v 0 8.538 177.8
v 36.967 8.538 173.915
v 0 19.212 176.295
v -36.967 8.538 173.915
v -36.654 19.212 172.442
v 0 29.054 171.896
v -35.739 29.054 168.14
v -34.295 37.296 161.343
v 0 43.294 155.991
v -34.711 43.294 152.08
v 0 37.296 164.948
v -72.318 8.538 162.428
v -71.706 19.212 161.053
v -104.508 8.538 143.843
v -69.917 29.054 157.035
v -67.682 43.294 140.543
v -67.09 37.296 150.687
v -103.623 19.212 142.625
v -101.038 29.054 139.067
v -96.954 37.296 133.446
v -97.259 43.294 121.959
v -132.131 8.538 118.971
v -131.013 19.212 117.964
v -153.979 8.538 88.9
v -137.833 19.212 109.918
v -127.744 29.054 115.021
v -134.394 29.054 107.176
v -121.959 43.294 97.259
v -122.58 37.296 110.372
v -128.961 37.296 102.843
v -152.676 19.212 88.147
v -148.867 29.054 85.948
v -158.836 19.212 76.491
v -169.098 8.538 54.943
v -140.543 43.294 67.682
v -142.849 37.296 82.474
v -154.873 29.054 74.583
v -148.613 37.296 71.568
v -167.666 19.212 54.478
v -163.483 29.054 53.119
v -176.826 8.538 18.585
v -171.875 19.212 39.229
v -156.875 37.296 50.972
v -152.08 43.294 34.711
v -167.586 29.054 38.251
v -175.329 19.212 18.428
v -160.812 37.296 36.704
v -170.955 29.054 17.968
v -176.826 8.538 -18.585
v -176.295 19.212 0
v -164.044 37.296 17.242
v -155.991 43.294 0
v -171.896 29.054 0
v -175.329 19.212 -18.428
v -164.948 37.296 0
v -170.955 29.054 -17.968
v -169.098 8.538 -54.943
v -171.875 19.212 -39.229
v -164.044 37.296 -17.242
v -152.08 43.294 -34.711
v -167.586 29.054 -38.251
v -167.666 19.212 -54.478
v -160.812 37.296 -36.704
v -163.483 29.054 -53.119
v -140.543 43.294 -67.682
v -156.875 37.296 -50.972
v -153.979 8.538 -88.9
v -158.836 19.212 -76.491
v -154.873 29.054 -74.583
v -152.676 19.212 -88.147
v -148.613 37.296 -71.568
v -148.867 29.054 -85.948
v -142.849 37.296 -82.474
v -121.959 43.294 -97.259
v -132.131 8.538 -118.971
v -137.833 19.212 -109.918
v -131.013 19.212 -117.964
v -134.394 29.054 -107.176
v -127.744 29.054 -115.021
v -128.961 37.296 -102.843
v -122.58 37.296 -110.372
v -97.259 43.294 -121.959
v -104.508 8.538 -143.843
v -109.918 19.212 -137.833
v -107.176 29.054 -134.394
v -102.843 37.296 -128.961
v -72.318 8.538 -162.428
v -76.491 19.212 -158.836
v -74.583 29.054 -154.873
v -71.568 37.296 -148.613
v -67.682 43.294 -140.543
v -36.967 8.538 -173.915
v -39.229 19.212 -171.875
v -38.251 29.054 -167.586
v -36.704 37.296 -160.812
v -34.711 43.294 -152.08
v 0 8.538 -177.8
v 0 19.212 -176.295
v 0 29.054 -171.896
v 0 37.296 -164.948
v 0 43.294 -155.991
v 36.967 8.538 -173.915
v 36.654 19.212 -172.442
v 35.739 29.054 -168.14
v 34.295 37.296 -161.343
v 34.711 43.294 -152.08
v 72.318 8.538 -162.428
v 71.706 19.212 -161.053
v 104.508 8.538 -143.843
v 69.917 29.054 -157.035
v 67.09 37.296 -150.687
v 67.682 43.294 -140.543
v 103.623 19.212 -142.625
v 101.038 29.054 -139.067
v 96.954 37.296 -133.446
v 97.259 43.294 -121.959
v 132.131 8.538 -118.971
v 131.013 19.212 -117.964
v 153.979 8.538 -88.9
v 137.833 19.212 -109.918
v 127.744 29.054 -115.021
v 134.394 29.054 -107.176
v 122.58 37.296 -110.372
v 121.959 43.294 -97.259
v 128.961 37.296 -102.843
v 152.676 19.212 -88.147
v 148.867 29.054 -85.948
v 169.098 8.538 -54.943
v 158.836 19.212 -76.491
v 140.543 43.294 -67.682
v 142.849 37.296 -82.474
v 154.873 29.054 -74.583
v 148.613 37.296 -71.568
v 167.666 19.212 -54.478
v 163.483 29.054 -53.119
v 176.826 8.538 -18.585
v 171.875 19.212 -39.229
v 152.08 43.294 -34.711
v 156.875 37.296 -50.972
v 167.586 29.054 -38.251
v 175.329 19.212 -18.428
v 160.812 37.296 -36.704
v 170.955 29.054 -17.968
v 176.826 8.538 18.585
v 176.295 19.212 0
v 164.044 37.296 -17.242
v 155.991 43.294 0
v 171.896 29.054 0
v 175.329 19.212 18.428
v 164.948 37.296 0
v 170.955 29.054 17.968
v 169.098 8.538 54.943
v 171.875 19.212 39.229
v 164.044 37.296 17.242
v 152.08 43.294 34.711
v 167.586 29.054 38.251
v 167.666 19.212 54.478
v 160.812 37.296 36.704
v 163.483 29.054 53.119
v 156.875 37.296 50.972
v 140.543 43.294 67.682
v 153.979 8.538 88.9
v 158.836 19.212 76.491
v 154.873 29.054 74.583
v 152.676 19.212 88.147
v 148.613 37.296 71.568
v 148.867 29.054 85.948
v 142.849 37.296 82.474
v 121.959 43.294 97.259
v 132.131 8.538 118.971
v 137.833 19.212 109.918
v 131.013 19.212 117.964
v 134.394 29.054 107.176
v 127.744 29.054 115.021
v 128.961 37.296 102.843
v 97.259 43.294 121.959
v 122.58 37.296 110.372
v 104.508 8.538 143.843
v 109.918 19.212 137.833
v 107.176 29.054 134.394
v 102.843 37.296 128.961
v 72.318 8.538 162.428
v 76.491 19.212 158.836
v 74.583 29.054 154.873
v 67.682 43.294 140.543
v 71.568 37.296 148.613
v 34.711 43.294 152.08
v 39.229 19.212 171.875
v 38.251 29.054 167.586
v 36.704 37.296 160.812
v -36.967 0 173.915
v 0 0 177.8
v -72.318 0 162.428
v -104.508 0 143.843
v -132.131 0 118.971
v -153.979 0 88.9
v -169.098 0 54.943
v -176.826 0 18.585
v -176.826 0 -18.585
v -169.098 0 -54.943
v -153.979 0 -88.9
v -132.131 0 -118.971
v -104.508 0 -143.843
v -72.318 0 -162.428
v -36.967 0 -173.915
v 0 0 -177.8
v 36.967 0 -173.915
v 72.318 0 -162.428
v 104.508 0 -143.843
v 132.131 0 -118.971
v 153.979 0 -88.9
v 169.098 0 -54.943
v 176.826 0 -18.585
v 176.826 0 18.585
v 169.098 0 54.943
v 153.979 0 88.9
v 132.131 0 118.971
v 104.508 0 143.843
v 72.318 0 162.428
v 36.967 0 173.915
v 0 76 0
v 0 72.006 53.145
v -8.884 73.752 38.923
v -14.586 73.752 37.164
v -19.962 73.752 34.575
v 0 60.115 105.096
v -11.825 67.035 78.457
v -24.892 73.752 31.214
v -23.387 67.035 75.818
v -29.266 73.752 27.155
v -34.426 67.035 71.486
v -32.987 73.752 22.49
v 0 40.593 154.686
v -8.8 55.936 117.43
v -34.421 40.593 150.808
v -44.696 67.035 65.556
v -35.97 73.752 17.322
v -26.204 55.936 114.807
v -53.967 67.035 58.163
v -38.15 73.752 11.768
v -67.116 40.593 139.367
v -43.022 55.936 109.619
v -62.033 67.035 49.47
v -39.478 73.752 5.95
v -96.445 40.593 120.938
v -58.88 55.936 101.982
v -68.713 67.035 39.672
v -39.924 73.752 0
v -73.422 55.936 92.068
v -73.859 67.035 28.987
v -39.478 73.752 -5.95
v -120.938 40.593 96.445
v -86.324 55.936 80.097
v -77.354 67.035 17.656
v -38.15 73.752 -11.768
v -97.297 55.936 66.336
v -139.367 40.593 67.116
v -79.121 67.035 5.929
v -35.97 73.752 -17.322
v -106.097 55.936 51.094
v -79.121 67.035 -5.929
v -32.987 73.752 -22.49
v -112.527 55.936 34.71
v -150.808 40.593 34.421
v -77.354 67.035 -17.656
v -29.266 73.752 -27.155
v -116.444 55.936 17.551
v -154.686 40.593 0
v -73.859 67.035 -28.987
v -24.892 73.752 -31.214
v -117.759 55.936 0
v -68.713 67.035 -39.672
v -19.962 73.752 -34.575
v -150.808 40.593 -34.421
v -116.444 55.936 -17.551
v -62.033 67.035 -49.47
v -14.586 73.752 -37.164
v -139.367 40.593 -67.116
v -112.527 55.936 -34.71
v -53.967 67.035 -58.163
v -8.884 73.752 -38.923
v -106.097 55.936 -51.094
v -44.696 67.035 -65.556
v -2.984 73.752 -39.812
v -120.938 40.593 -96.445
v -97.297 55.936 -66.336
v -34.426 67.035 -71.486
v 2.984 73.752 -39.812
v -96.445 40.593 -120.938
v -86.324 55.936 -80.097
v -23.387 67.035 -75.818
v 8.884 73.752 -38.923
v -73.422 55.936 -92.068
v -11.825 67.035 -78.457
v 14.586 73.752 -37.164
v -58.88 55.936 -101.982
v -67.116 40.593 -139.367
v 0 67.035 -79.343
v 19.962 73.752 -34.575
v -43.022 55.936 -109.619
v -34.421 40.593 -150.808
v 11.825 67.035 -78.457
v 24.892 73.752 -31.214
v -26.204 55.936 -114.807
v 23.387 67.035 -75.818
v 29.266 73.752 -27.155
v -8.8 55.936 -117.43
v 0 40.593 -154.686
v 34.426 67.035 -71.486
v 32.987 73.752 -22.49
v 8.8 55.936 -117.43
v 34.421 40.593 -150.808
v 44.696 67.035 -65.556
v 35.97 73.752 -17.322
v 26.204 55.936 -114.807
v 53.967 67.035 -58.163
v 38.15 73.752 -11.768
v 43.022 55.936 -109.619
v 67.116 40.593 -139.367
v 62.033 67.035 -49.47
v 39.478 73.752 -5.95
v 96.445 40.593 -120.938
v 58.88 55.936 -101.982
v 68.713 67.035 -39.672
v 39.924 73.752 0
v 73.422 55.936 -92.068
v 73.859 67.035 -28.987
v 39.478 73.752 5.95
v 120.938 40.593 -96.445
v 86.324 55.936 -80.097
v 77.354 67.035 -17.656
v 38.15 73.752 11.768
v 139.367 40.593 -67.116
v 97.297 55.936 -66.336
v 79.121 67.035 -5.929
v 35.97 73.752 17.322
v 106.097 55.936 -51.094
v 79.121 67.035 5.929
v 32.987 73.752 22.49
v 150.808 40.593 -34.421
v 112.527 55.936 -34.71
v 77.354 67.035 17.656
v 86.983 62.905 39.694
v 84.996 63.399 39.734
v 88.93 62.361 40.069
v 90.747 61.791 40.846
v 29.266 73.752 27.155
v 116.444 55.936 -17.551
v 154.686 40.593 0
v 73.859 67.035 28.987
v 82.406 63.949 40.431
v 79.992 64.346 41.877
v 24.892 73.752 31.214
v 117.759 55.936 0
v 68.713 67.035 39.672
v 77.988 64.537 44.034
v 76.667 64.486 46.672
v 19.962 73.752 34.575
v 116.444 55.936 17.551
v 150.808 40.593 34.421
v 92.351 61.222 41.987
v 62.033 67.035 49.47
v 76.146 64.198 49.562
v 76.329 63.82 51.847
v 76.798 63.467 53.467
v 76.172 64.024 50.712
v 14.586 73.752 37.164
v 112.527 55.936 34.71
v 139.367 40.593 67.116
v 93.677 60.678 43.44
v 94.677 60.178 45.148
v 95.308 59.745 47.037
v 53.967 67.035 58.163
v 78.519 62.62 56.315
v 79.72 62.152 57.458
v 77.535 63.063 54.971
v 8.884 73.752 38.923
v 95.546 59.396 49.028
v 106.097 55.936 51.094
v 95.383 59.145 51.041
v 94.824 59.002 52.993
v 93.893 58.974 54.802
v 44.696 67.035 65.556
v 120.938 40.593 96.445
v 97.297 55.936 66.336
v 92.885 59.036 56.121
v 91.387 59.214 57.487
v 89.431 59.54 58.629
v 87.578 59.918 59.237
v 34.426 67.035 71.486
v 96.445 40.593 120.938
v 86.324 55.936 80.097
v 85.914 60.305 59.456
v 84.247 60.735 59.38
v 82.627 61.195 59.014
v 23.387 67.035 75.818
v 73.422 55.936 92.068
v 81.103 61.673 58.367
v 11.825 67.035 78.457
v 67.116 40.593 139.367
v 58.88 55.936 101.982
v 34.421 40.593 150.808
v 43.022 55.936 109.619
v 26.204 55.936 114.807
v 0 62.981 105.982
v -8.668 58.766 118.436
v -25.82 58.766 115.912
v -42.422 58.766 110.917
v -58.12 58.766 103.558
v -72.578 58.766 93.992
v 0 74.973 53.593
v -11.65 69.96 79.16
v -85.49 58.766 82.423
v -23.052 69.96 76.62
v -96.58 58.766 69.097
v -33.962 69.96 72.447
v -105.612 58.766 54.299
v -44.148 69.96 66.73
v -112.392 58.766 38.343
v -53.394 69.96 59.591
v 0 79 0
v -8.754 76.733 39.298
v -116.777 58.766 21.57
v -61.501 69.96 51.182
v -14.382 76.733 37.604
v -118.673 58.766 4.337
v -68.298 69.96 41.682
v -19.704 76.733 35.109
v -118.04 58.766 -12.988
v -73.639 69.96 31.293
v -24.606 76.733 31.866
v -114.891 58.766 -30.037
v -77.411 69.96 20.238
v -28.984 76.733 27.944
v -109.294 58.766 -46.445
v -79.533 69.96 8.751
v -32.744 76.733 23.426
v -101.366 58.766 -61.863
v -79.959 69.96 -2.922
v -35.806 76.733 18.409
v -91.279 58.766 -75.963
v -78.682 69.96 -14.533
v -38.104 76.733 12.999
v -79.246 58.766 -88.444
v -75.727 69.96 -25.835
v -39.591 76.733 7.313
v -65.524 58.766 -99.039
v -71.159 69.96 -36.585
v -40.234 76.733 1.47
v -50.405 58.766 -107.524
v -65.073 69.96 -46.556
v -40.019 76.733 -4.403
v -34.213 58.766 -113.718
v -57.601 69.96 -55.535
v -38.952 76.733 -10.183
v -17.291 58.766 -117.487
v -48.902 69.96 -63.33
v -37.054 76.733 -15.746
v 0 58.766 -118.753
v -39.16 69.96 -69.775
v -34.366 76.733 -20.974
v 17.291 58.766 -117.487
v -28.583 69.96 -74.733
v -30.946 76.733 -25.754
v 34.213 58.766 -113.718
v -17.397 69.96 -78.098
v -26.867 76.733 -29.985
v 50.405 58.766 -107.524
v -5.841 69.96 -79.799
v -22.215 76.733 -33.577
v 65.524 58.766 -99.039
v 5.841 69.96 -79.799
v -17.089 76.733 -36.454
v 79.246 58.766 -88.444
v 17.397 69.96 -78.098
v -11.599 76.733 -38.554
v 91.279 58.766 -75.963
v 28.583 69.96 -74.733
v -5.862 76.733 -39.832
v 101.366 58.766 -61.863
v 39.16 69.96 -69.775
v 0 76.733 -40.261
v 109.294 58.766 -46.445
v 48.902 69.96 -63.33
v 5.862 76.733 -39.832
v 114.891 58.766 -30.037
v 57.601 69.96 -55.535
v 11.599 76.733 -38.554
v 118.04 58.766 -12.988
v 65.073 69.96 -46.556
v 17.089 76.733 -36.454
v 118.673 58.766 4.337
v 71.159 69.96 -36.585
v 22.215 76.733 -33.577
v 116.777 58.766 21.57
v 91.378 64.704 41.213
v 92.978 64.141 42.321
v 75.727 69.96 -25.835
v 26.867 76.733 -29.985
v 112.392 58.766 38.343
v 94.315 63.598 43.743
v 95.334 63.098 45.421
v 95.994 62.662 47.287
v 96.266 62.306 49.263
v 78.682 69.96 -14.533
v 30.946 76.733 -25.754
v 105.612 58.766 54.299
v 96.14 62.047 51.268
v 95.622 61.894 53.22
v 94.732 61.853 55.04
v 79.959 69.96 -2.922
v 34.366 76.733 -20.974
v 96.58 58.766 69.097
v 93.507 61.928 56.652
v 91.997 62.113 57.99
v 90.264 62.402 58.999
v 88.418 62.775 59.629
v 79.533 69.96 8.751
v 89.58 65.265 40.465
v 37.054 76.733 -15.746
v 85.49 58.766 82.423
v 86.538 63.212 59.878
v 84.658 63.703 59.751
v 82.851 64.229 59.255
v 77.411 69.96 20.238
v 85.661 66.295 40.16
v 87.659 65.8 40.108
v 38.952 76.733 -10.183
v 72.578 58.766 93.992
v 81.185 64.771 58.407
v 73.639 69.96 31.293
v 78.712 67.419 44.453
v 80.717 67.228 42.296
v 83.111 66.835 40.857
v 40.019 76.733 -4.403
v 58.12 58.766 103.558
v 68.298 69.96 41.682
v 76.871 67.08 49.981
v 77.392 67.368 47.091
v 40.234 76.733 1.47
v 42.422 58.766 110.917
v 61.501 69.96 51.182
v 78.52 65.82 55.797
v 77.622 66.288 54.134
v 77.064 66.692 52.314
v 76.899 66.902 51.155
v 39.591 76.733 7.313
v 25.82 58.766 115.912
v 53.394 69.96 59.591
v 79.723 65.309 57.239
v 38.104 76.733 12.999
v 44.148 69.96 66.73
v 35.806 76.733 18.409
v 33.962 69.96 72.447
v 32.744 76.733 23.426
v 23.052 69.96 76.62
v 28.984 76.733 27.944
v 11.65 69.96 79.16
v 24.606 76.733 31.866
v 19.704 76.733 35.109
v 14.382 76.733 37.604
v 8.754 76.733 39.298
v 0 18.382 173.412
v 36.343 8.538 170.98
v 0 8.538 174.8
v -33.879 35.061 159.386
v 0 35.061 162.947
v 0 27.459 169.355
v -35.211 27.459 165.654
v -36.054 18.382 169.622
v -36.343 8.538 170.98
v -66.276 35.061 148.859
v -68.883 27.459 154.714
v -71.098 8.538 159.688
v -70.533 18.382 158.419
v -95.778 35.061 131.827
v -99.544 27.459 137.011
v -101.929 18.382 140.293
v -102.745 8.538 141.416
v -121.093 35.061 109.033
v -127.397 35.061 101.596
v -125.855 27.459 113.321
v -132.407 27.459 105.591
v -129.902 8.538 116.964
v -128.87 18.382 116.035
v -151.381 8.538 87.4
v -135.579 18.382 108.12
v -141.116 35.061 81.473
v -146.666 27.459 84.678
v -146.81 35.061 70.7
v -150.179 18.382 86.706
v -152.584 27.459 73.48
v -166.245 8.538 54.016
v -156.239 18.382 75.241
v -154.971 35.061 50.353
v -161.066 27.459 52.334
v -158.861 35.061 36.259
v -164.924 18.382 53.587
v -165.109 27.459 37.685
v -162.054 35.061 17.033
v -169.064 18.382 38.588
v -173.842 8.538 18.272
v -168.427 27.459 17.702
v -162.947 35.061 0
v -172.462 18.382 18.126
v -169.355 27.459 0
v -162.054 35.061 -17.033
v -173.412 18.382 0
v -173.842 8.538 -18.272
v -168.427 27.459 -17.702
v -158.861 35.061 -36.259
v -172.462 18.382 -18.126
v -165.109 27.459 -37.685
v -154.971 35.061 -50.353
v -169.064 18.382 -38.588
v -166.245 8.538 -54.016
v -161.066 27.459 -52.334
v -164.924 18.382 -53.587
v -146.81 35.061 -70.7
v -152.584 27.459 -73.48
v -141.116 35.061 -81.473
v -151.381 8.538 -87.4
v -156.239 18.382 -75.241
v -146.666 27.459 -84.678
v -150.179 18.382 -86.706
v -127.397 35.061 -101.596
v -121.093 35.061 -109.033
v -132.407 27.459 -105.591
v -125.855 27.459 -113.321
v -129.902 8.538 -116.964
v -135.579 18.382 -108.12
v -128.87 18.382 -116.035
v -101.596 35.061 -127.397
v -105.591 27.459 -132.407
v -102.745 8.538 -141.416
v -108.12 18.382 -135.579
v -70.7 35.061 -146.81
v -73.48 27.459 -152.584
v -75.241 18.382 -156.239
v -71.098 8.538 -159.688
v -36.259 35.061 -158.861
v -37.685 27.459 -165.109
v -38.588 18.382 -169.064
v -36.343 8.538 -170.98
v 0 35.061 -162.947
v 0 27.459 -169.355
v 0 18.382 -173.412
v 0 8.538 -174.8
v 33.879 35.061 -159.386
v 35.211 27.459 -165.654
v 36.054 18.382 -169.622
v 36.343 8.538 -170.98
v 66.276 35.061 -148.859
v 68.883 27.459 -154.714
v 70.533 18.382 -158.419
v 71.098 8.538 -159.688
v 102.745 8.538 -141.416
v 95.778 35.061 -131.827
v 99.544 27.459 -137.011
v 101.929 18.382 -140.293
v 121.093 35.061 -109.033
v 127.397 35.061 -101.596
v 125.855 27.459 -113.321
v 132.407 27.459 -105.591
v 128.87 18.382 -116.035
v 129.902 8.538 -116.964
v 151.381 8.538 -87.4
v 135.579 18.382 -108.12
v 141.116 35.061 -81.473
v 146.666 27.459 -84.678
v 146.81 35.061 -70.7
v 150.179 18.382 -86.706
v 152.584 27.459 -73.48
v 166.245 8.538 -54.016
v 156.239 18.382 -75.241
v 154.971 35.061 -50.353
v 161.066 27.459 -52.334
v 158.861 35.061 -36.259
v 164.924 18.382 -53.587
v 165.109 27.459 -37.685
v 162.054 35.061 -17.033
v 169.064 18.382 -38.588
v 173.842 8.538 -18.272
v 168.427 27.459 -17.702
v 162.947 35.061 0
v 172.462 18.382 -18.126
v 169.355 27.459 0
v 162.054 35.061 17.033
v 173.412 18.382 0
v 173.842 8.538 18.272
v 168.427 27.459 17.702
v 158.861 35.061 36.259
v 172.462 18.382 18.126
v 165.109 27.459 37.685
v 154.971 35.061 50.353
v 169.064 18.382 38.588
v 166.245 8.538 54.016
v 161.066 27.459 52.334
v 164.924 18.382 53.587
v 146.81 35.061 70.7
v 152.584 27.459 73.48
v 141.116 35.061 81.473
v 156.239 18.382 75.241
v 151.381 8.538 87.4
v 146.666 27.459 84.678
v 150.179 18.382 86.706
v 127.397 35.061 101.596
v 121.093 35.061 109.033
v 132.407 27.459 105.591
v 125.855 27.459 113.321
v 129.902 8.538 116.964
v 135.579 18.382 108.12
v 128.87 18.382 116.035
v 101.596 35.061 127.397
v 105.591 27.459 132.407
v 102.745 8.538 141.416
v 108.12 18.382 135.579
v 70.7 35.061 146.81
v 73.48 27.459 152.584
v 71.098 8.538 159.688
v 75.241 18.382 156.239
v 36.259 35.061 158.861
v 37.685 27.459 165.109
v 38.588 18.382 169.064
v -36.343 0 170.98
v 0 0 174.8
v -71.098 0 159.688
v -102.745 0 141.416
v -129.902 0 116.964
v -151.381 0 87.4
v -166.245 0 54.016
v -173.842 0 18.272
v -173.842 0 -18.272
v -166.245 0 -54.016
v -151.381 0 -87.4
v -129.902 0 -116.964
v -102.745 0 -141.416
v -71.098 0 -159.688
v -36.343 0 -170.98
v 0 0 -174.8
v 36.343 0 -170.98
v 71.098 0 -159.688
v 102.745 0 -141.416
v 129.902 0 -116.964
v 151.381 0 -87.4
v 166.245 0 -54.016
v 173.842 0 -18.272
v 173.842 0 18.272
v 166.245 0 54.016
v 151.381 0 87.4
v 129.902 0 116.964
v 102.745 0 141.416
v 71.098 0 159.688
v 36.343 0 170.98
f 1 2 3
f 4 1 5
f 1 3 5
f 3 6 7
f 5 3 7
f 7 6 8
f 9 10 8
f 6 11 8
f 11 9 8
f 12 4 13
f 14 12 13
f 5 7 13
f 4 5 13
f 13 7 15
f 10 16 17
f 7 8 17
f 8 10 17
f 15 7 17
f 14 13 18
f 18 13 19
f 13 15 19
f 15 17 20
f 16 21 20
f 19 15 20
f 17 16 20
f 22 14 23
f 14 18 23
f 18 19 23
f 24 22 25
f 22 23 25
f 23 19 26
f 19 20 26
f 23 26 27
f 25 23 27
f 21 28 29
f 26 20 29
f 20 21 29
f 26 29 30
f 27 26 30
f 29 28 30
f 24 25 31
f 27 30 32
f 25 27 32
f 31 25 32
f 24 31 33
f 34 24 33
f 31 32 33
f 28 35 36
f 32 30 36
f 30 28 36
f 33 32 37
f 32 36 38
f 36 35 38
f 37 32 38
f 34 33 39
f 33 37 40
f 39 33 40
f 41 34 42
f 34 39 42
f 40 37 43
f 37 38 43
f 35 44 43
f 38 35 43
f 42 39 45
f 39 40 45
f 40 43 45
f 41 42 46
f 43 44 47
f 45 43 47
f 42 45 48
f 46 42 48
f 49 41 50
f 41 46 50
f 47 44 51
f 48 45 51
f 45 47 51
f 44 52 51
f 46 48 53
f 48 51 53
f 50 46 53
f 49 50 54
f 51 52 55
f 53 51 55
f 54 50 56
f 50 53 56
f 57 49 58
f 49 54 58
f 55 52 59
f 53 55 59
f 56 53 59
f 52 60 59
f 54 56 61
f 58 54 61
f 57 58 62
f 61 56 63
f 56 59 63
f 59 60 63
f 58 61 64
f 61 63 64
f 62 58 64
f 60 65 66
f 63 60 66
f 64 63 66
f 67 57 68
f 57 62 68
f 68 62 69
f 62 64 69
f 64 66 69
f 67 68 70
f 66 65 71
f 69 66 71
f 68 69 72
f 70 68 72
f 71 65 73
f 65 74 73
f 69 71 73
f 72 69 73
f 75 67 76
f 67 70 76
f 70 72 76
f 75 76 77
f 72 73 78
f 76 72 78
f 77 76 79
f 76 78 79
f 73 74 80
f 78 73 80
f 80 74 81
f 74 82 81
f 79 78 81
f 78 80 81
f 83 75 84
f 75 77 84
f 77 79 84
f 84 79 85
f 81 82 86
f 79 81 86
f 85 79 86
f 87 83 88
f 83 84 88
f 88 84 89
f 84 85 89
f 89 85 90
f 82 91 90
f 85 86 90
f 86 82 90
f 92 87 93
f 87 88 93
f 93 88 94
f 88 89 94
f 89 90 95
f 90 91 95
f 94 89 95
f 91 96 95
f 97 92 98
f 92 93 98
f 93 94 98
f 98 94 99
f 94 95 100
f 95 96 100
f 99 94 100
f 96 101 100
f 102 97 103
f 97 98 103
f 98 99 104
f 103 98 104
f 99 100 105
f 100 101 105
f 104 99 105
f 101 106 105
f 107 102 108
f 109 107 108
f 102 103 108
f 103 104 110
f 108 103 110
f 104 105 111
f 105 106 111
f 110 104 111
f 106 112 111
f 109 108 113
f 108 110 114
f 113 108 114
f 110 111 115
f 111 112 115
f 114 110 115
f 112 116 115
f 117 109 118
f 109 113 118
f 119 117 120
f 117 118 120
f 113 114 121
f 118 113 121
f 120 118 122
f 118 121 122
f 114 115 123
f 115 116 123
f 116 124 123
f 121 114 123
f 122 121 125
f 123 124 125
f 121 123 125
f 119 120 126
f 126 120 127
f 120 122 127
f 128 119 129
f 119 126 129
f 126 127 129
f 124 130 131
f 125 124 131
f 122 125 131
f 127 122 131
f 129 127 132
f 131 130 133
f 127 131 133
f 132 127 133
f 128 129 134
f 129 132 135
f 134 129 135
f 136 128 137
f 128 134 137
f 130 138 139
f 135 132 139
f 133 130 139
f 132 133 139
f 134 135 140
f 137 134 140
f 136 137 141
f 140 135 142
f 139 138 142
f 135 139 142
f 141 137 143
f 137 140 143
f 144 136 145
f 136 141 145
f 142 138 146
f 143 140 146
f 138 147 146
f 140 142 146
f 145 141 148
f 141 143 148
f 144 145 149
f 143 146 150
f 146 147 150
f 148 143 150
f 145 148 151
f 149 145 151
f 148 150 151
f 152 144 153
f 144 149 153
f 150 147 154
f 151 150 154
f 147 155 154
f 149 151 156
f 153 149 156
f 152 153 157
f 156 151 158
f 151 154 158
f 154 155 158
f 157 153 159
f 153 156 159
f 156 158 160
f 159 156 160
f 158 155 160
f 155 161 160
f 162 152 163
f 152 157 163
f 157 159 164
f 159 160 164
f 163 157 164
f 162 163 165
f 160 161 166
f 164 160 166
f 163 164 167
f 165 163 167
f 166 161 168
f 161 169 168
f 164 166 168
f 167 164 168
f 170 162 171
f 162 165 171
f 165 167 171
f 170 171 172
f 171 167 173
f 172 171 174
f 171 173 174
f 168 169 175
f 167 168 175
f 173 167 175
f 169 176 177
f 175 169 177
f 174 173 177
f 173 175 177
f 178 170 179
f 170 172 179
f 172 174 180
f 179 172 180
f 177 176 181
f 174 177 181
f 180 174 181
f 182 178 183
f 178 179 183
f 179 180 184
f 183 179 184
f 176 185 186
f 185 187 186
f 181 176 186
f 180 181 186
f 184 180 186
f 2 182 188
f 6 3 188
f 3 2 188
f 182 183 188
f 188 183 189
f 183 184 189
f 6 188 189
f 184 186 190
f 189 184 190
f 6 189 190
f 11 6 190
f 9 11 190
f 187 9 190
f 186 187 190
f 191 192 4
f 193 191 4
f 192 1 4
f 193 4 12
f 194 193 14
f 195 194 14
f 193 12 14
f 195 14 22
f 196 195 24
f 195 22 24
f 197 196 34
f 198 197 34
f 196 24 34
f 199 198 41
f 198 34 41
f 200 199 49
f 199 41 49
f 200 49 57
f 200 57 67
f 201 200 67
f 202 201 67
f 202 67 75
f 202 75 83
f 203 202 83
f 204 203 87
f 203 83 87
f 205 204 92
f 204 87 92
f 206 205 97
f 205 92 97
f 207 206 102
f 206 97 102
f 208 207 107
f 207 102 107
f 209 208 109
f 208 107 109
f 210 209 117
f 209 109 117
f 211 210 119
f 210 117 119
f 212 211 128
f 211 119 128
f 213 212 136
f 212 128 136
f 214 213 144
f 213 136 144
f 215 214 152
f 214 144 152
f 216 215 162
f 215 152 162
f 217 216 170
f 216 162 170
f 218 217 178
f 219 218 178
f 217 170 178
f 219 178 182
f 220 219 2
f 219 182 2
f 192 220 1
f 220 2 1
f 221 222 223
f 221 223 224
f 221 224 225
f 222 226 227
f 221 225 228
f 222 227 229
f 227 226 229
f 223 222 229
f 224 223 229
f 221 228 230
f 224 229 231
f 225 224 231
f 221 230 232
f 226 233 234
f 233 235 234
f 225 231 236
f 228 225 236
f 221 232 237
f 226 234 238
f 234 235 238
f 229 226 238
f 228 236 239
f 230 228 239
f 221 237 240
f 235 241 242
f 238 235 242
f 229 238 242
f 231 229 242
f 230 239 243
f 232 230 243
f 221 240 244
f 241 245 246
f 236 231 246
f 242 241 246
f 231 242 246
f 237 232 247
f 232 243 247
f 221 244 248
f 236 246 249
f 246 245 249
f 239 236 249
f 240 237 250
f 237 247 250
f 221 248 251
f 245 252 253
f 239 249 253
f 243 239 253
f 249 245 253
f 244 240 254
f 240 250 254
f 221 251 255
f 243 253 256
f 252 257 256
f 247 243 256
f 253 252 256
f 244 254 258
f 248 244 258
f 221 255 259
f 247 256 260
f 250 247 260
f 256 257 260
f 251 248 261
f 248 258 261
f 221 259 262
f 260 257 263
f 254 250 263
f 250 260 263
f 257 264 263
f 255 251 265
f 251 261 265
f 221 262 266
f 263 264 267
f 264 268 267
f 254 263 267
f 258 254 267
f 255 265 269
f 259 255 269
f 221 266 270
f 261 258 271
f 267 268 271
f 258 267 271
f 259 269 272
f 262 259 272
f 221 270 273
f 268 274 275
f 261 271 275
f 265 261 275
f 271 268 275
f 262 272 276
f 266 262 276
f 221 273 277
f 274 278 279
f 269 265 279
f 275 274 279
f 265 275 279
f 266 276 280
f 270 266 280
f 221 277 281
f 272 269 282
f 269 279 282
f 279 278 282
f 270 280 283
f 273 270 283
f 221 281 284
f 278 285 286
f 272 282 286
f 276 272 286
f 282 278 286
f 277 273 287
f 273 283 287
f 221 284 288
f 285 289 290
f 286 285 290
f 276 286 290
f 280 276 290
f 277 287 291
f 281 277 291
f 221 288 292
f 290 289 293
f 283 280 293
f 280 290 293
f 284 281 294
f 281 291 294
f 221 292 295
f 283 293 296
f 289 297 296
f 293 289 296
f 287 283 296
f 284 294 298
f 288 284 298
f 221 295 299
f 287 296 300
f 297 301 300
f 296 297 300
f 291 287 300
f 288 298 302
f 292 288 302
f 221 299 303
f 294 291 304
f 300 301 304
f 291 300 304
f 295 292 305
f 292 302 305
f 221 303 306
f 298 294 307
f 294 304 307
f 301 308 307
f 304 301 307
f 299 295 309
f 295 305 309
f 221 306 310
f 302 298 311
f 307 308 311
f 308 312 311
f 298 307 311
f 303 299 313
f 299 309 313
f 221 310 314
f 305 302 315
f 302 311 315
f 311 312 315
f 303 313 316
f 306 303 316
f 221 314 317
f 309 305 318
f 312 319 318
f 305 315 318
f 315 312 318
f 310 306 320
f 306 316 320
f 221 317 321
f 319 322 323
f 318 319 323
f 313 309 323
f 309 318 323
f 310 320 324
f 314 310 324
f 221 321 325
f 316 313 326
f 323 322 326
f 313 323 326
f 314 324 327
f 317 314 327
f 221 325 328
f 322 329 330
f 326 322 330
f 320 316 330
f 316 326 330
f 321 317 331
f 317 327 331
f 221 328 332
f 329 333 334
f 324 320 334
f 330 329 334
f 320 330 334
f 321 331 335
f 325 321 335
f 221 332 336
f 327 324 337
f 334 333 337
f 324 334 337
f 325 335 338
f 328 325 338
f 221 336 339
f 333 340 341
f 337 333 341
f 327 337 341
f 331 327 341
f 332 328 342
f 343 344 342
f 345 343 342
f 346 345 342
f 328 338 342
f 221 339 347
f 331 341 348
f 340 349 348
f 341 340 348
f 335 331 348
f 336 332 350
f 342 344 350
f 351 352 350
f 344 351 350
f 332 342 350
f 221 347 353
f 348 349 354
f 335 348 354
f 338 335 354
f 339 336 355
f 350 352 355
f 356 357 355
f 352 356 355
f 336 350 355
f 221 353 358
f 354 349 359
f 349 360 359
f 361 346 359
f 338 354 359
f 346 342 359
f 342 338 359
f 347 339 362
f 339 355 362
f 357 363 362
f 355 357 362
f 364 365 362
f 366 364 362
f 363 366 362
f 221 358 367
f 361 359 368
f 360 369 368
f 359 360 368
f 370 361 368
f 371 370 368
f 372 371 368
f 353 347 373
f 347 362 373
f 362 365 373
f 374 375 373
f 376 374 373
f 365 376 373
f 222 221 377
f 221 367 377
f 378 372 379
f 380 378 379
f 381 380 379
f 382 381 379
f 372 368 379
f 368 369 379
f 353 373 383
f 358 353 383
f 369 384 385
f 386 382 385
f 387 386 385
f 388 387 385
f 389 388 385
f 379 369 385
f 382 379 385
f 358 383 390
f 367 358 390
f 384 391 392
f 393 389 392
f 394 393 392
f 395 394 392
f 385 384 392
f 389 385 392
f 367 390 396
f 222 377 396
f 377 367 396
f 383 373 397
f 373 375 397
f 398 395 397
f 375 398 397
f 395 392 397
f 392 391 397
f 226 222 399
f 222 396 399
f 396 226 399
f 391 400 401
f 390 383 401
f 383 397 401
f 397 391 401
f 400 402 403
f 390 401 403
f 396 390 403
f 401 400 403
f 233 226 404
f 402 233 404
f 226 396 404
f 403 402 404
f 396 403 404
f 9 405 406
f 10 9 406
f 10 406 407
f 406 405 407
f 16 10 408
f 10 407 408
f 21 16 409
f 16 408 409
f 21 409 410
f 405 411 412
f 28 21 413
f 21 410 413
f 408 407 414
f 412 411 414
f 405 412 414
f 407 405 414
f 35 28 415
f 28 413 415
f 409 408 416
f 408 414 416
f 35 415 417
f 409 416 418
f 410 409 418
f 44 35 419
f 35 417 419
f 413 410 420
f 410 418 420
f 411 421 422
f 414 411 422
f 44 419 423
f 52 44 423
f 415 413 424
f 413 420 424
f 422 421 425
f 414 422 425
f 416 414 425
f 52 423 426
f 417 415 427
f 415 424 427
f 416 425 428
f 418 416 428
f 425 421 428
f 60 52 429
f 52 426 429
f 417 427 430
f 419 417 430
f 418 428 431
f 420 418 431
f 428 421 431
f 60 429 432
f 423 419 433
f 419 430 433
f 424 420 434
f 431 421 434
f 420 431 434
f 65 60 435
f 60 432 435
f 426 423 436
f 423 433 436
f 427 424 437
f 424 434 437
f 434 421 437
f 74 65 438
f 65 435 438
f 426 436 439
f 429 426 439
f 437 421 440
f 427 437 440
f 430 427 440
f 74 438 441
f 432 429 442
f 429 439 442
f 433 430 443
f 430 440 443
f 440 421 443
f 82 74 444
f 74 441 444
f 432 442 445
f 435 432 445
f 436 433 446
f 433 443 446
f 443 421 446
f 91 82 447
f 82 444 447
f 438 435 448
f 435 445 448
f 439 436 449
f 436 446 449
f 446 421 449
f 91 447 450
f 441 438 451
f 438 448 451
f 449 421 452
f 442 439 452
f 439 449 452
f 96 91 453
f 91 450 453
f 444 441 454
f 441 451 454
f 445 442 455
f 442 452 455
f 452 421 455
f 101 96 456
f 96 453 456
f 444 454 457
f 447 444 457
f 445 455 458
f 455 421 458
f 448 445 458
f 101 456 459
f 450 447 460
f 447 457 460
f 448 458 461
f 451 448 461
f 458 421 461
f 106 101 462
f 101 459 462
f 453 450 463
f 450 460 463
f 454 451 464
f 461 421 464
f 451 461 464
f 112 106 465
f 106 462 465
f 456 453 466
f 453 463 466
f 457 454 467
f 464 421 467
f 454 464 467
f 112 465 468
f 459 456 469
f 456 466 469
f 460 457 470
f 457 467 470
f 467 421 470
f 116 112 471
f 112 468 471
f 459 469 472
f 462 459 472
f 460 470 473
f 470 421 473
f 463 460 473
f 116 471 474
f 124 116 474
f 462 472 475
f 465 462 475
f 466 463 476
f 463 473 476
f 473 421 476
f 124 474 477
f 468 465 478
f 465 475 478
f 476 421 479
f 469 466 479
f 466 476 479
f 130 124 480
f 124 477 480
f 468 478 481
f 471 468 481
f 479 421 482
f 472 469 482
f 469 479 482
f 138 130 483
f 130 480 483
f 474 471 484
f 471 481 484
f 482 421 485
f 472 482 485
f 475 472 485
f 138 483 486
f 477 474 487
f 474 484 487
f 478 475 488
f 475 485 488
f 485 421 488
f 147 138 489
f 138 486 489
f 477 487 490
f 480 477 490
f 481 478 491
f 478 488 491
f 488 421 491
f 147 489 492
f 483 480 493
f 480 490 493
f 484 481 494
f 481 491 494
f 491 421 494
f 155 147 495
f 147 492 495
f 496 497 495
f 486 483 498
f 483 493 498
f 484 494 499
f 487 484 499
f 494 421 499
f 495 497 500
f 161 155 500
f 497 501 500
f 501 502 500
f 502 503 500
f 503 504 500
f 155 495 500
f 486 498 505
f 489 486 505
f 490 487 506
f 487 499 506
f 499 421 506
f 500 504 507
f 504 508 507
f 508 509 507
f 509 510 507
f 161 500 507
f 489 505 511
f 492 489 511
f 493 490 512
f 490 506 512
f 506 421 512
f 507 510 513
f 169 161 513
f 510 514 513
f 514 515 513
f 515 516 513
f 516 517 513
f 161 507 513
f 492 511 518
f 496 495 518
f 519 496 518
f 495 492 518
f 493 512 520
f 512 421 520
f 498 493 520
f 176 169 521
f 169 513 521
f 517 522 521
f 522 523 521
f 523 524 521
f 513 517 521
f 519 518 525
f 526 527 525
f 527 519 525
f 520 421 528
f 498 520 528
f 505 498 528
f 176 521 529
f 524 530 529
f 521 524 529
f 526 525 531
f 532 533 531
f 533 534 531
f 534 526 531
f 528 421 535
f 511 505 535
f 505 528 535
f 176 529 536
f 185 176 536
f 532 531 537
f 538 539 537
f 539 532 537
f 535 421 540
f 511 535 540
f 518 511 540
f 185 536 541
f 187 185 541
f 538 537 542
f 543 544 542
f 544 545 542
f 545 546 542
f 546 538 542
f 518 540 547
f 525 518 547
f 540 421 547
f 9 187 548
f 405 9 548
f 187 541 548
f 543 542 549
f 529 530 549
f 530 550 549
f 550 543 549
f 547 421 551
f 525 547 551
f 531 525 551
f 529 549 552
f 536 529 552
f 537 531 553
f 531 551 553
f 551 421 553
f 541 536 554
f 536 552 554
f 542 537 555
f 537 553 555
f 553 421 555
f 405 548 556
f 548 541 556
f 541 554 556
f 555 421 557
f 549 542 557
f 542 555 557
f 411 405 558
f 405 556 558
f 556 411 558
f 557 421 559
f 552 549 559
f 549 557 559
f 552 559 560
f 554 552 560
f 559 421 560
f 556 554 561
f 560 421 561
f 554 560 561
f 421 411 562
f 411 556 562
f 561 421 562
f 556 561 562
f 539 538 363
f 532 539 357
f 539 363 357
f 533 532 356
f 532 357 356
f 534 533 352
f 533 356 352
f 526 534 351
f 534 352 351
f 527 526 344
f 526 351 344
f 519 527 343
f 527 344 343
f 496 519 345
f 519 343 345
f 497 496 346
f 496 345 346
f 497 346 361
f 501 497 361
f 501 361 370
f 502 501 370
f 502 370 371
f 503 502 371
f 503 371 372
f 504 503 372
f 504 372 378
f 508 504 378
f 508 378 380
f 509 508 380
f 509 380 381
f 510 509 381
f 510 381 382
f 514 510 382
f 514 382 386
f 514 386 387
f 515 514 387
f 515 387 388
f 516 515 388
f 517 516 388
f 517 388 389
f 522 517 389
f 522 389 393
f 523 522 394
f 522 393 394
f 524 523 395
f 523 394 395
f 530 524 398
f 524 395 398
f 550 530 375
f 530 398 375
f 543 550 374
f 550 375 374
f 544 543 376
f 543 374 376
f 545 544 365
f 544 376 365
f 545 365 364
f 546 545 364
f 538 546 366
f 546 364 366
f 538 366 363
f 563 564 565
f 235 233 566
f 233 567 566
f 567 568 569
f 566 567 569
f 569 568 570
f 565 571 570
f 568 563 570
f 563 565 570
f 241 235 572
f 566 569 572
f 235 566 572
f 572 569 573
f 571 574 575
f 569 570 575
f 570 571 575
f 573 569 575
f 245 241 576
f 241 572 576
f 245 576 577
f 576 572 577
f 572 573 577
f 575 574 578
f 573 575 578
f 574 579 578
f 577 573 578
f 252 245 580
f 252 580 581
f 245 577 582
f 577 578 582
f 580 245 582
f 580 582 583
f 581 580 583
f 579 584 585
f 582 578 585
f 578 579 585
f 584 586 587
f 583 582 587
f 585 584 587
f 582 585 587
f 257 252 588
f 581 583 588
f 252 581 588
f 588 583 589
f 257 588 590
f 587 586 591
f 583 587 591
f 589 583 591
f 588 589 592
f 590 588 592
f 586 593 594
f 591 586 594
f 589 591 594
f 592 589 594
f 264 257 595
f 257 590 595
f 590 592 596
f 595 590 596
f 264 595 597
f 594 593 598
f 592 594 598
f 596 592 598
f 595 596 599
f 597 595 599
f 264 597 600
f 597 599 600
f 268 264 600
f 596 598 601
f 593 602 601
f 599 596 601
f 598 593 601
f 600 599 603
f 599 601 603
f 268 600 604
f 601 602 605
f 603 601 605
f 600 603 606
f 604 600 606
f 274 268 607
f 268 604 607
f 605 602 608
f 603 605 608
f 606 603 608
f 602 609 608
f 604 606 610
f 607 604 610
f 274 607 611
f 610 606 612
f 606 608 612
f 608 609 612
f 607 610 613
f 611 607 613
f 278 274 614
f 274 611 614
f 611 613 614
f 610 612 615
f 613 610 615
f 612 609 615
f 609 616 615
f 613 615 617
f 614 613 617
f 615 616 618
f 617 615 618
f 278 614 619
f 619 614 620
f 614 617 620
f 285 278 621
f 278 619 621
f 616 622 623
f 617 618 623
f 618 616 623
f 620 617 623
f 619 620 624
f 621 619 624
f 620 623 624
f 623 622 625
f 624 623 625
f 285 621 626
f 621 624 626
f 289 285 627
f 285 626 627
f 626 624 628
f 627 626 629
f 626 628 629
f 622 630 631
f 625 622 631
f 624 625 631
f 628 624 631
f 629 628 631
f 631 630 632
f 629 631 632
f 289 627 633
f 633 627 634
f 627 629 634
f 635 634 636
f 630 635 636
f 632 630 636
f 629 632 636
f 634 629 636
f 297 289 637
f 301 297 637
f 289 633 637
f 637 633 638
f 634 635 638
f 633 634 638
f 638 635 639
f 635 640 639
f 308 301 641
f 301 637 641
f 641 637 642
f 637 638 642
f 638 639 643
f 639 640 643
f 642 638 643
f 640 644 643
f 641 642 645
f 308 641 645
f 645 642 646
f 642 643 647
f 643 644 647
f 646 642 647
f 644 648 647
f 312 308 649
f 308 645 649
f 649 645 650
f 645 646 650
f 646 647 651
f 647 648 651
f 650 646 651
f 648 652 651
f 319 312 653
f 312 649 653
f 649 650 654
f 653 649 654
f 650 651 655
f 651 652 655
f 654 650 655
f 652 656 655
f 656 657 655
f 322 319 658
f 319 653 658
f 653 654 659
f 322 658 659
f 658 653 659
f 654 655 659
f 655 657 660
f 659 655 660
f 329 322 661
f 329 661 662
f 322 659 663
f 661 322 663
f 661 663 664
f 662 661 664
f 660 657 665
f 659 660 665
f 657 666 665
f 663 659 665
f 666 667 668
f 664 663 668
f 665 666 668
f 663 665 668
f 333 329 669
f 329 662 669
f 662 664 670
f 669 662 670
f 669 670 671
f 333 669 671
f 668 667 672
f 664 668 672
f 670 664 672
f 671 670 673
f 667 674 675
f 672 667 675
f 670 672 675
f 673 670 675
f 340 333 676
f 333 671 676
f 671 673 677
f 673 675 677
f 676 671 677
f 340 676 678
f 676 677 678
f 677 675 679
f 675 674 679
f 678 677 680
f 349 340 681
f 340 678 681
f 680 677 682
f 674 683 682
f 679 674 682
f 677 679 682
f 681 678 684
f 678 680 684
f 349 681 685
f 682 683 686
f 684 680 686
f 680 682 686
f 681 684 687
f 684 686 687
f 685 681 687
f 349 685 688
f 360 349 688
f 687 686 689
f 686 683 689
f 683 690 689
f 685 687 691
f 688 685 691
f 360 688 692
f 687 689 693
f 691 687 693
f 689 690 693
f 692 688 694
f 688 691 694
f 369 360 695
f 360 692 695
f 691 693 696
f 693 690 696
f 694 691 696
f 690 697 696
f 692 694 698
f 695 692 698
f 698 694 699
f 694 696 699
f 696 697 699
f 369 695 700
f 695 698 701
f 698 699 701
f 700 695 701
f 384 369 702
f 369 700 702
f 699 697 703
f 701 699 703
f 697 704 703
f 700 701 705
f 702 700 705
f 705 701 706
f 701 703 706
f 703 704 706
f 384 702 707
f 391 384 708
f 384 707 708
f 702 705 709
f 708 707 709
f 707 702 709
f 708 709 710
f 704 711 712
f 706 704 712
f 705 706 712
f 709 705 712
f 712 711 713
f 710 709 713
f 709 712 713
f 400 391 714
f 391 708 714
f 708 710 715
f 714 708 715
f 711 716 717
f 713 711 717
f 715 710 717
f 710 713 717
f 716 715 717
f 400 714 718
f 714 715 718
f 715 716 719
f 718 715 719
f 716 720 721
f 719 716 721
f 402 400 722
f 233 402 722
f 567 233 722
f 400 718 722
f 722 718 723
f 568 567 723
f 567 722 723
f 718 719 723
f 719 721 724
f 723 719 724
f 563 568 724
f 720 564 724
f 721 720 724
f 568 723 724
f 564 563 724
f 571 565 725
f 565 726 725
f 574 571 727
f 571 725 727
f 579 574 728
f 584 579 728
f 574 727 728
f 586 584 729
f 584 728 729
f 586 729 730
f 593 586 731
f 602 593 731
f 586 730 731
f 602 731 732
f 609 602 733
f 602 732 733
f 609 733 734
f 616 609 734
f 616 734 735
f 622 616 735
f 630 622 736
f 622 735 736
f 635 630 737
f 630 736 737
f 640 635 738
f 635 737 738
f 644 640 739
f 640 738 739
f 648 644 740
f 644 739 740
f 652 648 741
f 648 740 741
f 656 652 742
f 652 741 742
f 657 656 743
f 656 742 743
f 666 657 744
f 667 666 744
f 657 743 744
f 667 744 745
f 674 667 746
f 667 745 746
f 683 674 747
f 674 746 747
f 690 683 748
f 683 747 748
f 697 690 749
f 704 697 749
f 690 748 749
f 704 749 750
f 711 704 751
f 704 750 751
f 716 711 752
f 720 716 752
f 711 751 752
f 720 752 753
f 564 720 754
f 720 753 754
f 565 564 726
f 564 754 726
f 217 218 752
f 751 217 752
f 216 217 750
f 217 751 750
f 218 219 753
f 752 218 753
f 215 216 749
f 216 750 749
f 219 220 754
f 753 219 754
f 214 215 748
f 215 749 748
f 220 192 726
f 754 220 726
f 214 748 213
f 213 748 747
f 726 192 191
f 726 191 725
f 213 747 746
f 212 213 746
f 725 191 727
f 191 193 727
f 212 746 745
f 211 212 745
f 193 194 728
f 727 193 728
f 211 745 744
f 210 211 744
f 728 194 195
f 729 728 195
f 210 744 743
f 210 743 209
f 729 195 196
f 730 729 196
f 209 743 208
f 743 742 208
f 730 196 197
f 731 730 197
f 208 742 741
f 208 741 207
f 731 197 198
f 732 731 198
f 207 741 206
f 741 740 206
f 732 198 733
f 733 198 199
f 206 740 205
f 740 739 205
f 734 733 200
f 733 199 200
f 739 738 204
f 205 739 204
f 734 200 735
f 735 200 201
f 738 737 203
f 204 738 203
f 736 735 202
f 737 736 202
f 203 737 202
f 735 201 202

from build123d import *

# Parameters (mm, degrees)
F_20_0_20_DURCHMESSER_BOHRUNG1_D = 20


with BuildPart() as part:
    # Skizze1 → Rotation1 (revolve)
    with BuildSketch(Plane(origin=(0, 0, 0), x_dir=(0, 0, -1), z_dir=(1, 0, 0)), mode=Mode.PRIVATE) as rotation1_sk:
        with BuildLine():
            Line((177.8, 0), (177.8, 8.537744837))
            ThreePointArc((177.8, 8.537744837), (171.896273488, 29.053926256), (155.991, 43.294360308))
            ThreePointArc((155.991, 43.294360308), (80.012631482, 69.959635546), (0, 79))
            Line((0, 79), (0, 76))
            ThreePointArc((0, 76), (79.343256428, 67.035266035), (154.686, 40.593068951))
            ThreePointArc((154.686, 40.593068951), (169.355112336, 27.459404384), (174.8, 8.537744837))
            Line((174.8, 8.537744837), (174.8, 0))
            Line((174.8, 0), (177.8, 0))
        make_face()
    revolve(rotation1_sk.sketch.rotate(Axis((0, 44.907564577, 0), (0, -1, 0)), 180), axis=Axis((0, 44.907564577, 0), (0, -1, 0)))  # turned: the seam where the file's is

    # Ø20.0 (20) Durchmesser Bohrung1 (through all)
    with Locations(Plane(origin=(86.602540378, 64.774737749, 50), x_dir=(0.969804385, -0.243884101, 0), z_dir=(0.241501786, 0.960331115, 0.139431121))):
        with Locations((0, 0)):
            Hole(F_20_0_20_DURCHMESSER_BOHRUNG1_D / 2)


solid = part.part
